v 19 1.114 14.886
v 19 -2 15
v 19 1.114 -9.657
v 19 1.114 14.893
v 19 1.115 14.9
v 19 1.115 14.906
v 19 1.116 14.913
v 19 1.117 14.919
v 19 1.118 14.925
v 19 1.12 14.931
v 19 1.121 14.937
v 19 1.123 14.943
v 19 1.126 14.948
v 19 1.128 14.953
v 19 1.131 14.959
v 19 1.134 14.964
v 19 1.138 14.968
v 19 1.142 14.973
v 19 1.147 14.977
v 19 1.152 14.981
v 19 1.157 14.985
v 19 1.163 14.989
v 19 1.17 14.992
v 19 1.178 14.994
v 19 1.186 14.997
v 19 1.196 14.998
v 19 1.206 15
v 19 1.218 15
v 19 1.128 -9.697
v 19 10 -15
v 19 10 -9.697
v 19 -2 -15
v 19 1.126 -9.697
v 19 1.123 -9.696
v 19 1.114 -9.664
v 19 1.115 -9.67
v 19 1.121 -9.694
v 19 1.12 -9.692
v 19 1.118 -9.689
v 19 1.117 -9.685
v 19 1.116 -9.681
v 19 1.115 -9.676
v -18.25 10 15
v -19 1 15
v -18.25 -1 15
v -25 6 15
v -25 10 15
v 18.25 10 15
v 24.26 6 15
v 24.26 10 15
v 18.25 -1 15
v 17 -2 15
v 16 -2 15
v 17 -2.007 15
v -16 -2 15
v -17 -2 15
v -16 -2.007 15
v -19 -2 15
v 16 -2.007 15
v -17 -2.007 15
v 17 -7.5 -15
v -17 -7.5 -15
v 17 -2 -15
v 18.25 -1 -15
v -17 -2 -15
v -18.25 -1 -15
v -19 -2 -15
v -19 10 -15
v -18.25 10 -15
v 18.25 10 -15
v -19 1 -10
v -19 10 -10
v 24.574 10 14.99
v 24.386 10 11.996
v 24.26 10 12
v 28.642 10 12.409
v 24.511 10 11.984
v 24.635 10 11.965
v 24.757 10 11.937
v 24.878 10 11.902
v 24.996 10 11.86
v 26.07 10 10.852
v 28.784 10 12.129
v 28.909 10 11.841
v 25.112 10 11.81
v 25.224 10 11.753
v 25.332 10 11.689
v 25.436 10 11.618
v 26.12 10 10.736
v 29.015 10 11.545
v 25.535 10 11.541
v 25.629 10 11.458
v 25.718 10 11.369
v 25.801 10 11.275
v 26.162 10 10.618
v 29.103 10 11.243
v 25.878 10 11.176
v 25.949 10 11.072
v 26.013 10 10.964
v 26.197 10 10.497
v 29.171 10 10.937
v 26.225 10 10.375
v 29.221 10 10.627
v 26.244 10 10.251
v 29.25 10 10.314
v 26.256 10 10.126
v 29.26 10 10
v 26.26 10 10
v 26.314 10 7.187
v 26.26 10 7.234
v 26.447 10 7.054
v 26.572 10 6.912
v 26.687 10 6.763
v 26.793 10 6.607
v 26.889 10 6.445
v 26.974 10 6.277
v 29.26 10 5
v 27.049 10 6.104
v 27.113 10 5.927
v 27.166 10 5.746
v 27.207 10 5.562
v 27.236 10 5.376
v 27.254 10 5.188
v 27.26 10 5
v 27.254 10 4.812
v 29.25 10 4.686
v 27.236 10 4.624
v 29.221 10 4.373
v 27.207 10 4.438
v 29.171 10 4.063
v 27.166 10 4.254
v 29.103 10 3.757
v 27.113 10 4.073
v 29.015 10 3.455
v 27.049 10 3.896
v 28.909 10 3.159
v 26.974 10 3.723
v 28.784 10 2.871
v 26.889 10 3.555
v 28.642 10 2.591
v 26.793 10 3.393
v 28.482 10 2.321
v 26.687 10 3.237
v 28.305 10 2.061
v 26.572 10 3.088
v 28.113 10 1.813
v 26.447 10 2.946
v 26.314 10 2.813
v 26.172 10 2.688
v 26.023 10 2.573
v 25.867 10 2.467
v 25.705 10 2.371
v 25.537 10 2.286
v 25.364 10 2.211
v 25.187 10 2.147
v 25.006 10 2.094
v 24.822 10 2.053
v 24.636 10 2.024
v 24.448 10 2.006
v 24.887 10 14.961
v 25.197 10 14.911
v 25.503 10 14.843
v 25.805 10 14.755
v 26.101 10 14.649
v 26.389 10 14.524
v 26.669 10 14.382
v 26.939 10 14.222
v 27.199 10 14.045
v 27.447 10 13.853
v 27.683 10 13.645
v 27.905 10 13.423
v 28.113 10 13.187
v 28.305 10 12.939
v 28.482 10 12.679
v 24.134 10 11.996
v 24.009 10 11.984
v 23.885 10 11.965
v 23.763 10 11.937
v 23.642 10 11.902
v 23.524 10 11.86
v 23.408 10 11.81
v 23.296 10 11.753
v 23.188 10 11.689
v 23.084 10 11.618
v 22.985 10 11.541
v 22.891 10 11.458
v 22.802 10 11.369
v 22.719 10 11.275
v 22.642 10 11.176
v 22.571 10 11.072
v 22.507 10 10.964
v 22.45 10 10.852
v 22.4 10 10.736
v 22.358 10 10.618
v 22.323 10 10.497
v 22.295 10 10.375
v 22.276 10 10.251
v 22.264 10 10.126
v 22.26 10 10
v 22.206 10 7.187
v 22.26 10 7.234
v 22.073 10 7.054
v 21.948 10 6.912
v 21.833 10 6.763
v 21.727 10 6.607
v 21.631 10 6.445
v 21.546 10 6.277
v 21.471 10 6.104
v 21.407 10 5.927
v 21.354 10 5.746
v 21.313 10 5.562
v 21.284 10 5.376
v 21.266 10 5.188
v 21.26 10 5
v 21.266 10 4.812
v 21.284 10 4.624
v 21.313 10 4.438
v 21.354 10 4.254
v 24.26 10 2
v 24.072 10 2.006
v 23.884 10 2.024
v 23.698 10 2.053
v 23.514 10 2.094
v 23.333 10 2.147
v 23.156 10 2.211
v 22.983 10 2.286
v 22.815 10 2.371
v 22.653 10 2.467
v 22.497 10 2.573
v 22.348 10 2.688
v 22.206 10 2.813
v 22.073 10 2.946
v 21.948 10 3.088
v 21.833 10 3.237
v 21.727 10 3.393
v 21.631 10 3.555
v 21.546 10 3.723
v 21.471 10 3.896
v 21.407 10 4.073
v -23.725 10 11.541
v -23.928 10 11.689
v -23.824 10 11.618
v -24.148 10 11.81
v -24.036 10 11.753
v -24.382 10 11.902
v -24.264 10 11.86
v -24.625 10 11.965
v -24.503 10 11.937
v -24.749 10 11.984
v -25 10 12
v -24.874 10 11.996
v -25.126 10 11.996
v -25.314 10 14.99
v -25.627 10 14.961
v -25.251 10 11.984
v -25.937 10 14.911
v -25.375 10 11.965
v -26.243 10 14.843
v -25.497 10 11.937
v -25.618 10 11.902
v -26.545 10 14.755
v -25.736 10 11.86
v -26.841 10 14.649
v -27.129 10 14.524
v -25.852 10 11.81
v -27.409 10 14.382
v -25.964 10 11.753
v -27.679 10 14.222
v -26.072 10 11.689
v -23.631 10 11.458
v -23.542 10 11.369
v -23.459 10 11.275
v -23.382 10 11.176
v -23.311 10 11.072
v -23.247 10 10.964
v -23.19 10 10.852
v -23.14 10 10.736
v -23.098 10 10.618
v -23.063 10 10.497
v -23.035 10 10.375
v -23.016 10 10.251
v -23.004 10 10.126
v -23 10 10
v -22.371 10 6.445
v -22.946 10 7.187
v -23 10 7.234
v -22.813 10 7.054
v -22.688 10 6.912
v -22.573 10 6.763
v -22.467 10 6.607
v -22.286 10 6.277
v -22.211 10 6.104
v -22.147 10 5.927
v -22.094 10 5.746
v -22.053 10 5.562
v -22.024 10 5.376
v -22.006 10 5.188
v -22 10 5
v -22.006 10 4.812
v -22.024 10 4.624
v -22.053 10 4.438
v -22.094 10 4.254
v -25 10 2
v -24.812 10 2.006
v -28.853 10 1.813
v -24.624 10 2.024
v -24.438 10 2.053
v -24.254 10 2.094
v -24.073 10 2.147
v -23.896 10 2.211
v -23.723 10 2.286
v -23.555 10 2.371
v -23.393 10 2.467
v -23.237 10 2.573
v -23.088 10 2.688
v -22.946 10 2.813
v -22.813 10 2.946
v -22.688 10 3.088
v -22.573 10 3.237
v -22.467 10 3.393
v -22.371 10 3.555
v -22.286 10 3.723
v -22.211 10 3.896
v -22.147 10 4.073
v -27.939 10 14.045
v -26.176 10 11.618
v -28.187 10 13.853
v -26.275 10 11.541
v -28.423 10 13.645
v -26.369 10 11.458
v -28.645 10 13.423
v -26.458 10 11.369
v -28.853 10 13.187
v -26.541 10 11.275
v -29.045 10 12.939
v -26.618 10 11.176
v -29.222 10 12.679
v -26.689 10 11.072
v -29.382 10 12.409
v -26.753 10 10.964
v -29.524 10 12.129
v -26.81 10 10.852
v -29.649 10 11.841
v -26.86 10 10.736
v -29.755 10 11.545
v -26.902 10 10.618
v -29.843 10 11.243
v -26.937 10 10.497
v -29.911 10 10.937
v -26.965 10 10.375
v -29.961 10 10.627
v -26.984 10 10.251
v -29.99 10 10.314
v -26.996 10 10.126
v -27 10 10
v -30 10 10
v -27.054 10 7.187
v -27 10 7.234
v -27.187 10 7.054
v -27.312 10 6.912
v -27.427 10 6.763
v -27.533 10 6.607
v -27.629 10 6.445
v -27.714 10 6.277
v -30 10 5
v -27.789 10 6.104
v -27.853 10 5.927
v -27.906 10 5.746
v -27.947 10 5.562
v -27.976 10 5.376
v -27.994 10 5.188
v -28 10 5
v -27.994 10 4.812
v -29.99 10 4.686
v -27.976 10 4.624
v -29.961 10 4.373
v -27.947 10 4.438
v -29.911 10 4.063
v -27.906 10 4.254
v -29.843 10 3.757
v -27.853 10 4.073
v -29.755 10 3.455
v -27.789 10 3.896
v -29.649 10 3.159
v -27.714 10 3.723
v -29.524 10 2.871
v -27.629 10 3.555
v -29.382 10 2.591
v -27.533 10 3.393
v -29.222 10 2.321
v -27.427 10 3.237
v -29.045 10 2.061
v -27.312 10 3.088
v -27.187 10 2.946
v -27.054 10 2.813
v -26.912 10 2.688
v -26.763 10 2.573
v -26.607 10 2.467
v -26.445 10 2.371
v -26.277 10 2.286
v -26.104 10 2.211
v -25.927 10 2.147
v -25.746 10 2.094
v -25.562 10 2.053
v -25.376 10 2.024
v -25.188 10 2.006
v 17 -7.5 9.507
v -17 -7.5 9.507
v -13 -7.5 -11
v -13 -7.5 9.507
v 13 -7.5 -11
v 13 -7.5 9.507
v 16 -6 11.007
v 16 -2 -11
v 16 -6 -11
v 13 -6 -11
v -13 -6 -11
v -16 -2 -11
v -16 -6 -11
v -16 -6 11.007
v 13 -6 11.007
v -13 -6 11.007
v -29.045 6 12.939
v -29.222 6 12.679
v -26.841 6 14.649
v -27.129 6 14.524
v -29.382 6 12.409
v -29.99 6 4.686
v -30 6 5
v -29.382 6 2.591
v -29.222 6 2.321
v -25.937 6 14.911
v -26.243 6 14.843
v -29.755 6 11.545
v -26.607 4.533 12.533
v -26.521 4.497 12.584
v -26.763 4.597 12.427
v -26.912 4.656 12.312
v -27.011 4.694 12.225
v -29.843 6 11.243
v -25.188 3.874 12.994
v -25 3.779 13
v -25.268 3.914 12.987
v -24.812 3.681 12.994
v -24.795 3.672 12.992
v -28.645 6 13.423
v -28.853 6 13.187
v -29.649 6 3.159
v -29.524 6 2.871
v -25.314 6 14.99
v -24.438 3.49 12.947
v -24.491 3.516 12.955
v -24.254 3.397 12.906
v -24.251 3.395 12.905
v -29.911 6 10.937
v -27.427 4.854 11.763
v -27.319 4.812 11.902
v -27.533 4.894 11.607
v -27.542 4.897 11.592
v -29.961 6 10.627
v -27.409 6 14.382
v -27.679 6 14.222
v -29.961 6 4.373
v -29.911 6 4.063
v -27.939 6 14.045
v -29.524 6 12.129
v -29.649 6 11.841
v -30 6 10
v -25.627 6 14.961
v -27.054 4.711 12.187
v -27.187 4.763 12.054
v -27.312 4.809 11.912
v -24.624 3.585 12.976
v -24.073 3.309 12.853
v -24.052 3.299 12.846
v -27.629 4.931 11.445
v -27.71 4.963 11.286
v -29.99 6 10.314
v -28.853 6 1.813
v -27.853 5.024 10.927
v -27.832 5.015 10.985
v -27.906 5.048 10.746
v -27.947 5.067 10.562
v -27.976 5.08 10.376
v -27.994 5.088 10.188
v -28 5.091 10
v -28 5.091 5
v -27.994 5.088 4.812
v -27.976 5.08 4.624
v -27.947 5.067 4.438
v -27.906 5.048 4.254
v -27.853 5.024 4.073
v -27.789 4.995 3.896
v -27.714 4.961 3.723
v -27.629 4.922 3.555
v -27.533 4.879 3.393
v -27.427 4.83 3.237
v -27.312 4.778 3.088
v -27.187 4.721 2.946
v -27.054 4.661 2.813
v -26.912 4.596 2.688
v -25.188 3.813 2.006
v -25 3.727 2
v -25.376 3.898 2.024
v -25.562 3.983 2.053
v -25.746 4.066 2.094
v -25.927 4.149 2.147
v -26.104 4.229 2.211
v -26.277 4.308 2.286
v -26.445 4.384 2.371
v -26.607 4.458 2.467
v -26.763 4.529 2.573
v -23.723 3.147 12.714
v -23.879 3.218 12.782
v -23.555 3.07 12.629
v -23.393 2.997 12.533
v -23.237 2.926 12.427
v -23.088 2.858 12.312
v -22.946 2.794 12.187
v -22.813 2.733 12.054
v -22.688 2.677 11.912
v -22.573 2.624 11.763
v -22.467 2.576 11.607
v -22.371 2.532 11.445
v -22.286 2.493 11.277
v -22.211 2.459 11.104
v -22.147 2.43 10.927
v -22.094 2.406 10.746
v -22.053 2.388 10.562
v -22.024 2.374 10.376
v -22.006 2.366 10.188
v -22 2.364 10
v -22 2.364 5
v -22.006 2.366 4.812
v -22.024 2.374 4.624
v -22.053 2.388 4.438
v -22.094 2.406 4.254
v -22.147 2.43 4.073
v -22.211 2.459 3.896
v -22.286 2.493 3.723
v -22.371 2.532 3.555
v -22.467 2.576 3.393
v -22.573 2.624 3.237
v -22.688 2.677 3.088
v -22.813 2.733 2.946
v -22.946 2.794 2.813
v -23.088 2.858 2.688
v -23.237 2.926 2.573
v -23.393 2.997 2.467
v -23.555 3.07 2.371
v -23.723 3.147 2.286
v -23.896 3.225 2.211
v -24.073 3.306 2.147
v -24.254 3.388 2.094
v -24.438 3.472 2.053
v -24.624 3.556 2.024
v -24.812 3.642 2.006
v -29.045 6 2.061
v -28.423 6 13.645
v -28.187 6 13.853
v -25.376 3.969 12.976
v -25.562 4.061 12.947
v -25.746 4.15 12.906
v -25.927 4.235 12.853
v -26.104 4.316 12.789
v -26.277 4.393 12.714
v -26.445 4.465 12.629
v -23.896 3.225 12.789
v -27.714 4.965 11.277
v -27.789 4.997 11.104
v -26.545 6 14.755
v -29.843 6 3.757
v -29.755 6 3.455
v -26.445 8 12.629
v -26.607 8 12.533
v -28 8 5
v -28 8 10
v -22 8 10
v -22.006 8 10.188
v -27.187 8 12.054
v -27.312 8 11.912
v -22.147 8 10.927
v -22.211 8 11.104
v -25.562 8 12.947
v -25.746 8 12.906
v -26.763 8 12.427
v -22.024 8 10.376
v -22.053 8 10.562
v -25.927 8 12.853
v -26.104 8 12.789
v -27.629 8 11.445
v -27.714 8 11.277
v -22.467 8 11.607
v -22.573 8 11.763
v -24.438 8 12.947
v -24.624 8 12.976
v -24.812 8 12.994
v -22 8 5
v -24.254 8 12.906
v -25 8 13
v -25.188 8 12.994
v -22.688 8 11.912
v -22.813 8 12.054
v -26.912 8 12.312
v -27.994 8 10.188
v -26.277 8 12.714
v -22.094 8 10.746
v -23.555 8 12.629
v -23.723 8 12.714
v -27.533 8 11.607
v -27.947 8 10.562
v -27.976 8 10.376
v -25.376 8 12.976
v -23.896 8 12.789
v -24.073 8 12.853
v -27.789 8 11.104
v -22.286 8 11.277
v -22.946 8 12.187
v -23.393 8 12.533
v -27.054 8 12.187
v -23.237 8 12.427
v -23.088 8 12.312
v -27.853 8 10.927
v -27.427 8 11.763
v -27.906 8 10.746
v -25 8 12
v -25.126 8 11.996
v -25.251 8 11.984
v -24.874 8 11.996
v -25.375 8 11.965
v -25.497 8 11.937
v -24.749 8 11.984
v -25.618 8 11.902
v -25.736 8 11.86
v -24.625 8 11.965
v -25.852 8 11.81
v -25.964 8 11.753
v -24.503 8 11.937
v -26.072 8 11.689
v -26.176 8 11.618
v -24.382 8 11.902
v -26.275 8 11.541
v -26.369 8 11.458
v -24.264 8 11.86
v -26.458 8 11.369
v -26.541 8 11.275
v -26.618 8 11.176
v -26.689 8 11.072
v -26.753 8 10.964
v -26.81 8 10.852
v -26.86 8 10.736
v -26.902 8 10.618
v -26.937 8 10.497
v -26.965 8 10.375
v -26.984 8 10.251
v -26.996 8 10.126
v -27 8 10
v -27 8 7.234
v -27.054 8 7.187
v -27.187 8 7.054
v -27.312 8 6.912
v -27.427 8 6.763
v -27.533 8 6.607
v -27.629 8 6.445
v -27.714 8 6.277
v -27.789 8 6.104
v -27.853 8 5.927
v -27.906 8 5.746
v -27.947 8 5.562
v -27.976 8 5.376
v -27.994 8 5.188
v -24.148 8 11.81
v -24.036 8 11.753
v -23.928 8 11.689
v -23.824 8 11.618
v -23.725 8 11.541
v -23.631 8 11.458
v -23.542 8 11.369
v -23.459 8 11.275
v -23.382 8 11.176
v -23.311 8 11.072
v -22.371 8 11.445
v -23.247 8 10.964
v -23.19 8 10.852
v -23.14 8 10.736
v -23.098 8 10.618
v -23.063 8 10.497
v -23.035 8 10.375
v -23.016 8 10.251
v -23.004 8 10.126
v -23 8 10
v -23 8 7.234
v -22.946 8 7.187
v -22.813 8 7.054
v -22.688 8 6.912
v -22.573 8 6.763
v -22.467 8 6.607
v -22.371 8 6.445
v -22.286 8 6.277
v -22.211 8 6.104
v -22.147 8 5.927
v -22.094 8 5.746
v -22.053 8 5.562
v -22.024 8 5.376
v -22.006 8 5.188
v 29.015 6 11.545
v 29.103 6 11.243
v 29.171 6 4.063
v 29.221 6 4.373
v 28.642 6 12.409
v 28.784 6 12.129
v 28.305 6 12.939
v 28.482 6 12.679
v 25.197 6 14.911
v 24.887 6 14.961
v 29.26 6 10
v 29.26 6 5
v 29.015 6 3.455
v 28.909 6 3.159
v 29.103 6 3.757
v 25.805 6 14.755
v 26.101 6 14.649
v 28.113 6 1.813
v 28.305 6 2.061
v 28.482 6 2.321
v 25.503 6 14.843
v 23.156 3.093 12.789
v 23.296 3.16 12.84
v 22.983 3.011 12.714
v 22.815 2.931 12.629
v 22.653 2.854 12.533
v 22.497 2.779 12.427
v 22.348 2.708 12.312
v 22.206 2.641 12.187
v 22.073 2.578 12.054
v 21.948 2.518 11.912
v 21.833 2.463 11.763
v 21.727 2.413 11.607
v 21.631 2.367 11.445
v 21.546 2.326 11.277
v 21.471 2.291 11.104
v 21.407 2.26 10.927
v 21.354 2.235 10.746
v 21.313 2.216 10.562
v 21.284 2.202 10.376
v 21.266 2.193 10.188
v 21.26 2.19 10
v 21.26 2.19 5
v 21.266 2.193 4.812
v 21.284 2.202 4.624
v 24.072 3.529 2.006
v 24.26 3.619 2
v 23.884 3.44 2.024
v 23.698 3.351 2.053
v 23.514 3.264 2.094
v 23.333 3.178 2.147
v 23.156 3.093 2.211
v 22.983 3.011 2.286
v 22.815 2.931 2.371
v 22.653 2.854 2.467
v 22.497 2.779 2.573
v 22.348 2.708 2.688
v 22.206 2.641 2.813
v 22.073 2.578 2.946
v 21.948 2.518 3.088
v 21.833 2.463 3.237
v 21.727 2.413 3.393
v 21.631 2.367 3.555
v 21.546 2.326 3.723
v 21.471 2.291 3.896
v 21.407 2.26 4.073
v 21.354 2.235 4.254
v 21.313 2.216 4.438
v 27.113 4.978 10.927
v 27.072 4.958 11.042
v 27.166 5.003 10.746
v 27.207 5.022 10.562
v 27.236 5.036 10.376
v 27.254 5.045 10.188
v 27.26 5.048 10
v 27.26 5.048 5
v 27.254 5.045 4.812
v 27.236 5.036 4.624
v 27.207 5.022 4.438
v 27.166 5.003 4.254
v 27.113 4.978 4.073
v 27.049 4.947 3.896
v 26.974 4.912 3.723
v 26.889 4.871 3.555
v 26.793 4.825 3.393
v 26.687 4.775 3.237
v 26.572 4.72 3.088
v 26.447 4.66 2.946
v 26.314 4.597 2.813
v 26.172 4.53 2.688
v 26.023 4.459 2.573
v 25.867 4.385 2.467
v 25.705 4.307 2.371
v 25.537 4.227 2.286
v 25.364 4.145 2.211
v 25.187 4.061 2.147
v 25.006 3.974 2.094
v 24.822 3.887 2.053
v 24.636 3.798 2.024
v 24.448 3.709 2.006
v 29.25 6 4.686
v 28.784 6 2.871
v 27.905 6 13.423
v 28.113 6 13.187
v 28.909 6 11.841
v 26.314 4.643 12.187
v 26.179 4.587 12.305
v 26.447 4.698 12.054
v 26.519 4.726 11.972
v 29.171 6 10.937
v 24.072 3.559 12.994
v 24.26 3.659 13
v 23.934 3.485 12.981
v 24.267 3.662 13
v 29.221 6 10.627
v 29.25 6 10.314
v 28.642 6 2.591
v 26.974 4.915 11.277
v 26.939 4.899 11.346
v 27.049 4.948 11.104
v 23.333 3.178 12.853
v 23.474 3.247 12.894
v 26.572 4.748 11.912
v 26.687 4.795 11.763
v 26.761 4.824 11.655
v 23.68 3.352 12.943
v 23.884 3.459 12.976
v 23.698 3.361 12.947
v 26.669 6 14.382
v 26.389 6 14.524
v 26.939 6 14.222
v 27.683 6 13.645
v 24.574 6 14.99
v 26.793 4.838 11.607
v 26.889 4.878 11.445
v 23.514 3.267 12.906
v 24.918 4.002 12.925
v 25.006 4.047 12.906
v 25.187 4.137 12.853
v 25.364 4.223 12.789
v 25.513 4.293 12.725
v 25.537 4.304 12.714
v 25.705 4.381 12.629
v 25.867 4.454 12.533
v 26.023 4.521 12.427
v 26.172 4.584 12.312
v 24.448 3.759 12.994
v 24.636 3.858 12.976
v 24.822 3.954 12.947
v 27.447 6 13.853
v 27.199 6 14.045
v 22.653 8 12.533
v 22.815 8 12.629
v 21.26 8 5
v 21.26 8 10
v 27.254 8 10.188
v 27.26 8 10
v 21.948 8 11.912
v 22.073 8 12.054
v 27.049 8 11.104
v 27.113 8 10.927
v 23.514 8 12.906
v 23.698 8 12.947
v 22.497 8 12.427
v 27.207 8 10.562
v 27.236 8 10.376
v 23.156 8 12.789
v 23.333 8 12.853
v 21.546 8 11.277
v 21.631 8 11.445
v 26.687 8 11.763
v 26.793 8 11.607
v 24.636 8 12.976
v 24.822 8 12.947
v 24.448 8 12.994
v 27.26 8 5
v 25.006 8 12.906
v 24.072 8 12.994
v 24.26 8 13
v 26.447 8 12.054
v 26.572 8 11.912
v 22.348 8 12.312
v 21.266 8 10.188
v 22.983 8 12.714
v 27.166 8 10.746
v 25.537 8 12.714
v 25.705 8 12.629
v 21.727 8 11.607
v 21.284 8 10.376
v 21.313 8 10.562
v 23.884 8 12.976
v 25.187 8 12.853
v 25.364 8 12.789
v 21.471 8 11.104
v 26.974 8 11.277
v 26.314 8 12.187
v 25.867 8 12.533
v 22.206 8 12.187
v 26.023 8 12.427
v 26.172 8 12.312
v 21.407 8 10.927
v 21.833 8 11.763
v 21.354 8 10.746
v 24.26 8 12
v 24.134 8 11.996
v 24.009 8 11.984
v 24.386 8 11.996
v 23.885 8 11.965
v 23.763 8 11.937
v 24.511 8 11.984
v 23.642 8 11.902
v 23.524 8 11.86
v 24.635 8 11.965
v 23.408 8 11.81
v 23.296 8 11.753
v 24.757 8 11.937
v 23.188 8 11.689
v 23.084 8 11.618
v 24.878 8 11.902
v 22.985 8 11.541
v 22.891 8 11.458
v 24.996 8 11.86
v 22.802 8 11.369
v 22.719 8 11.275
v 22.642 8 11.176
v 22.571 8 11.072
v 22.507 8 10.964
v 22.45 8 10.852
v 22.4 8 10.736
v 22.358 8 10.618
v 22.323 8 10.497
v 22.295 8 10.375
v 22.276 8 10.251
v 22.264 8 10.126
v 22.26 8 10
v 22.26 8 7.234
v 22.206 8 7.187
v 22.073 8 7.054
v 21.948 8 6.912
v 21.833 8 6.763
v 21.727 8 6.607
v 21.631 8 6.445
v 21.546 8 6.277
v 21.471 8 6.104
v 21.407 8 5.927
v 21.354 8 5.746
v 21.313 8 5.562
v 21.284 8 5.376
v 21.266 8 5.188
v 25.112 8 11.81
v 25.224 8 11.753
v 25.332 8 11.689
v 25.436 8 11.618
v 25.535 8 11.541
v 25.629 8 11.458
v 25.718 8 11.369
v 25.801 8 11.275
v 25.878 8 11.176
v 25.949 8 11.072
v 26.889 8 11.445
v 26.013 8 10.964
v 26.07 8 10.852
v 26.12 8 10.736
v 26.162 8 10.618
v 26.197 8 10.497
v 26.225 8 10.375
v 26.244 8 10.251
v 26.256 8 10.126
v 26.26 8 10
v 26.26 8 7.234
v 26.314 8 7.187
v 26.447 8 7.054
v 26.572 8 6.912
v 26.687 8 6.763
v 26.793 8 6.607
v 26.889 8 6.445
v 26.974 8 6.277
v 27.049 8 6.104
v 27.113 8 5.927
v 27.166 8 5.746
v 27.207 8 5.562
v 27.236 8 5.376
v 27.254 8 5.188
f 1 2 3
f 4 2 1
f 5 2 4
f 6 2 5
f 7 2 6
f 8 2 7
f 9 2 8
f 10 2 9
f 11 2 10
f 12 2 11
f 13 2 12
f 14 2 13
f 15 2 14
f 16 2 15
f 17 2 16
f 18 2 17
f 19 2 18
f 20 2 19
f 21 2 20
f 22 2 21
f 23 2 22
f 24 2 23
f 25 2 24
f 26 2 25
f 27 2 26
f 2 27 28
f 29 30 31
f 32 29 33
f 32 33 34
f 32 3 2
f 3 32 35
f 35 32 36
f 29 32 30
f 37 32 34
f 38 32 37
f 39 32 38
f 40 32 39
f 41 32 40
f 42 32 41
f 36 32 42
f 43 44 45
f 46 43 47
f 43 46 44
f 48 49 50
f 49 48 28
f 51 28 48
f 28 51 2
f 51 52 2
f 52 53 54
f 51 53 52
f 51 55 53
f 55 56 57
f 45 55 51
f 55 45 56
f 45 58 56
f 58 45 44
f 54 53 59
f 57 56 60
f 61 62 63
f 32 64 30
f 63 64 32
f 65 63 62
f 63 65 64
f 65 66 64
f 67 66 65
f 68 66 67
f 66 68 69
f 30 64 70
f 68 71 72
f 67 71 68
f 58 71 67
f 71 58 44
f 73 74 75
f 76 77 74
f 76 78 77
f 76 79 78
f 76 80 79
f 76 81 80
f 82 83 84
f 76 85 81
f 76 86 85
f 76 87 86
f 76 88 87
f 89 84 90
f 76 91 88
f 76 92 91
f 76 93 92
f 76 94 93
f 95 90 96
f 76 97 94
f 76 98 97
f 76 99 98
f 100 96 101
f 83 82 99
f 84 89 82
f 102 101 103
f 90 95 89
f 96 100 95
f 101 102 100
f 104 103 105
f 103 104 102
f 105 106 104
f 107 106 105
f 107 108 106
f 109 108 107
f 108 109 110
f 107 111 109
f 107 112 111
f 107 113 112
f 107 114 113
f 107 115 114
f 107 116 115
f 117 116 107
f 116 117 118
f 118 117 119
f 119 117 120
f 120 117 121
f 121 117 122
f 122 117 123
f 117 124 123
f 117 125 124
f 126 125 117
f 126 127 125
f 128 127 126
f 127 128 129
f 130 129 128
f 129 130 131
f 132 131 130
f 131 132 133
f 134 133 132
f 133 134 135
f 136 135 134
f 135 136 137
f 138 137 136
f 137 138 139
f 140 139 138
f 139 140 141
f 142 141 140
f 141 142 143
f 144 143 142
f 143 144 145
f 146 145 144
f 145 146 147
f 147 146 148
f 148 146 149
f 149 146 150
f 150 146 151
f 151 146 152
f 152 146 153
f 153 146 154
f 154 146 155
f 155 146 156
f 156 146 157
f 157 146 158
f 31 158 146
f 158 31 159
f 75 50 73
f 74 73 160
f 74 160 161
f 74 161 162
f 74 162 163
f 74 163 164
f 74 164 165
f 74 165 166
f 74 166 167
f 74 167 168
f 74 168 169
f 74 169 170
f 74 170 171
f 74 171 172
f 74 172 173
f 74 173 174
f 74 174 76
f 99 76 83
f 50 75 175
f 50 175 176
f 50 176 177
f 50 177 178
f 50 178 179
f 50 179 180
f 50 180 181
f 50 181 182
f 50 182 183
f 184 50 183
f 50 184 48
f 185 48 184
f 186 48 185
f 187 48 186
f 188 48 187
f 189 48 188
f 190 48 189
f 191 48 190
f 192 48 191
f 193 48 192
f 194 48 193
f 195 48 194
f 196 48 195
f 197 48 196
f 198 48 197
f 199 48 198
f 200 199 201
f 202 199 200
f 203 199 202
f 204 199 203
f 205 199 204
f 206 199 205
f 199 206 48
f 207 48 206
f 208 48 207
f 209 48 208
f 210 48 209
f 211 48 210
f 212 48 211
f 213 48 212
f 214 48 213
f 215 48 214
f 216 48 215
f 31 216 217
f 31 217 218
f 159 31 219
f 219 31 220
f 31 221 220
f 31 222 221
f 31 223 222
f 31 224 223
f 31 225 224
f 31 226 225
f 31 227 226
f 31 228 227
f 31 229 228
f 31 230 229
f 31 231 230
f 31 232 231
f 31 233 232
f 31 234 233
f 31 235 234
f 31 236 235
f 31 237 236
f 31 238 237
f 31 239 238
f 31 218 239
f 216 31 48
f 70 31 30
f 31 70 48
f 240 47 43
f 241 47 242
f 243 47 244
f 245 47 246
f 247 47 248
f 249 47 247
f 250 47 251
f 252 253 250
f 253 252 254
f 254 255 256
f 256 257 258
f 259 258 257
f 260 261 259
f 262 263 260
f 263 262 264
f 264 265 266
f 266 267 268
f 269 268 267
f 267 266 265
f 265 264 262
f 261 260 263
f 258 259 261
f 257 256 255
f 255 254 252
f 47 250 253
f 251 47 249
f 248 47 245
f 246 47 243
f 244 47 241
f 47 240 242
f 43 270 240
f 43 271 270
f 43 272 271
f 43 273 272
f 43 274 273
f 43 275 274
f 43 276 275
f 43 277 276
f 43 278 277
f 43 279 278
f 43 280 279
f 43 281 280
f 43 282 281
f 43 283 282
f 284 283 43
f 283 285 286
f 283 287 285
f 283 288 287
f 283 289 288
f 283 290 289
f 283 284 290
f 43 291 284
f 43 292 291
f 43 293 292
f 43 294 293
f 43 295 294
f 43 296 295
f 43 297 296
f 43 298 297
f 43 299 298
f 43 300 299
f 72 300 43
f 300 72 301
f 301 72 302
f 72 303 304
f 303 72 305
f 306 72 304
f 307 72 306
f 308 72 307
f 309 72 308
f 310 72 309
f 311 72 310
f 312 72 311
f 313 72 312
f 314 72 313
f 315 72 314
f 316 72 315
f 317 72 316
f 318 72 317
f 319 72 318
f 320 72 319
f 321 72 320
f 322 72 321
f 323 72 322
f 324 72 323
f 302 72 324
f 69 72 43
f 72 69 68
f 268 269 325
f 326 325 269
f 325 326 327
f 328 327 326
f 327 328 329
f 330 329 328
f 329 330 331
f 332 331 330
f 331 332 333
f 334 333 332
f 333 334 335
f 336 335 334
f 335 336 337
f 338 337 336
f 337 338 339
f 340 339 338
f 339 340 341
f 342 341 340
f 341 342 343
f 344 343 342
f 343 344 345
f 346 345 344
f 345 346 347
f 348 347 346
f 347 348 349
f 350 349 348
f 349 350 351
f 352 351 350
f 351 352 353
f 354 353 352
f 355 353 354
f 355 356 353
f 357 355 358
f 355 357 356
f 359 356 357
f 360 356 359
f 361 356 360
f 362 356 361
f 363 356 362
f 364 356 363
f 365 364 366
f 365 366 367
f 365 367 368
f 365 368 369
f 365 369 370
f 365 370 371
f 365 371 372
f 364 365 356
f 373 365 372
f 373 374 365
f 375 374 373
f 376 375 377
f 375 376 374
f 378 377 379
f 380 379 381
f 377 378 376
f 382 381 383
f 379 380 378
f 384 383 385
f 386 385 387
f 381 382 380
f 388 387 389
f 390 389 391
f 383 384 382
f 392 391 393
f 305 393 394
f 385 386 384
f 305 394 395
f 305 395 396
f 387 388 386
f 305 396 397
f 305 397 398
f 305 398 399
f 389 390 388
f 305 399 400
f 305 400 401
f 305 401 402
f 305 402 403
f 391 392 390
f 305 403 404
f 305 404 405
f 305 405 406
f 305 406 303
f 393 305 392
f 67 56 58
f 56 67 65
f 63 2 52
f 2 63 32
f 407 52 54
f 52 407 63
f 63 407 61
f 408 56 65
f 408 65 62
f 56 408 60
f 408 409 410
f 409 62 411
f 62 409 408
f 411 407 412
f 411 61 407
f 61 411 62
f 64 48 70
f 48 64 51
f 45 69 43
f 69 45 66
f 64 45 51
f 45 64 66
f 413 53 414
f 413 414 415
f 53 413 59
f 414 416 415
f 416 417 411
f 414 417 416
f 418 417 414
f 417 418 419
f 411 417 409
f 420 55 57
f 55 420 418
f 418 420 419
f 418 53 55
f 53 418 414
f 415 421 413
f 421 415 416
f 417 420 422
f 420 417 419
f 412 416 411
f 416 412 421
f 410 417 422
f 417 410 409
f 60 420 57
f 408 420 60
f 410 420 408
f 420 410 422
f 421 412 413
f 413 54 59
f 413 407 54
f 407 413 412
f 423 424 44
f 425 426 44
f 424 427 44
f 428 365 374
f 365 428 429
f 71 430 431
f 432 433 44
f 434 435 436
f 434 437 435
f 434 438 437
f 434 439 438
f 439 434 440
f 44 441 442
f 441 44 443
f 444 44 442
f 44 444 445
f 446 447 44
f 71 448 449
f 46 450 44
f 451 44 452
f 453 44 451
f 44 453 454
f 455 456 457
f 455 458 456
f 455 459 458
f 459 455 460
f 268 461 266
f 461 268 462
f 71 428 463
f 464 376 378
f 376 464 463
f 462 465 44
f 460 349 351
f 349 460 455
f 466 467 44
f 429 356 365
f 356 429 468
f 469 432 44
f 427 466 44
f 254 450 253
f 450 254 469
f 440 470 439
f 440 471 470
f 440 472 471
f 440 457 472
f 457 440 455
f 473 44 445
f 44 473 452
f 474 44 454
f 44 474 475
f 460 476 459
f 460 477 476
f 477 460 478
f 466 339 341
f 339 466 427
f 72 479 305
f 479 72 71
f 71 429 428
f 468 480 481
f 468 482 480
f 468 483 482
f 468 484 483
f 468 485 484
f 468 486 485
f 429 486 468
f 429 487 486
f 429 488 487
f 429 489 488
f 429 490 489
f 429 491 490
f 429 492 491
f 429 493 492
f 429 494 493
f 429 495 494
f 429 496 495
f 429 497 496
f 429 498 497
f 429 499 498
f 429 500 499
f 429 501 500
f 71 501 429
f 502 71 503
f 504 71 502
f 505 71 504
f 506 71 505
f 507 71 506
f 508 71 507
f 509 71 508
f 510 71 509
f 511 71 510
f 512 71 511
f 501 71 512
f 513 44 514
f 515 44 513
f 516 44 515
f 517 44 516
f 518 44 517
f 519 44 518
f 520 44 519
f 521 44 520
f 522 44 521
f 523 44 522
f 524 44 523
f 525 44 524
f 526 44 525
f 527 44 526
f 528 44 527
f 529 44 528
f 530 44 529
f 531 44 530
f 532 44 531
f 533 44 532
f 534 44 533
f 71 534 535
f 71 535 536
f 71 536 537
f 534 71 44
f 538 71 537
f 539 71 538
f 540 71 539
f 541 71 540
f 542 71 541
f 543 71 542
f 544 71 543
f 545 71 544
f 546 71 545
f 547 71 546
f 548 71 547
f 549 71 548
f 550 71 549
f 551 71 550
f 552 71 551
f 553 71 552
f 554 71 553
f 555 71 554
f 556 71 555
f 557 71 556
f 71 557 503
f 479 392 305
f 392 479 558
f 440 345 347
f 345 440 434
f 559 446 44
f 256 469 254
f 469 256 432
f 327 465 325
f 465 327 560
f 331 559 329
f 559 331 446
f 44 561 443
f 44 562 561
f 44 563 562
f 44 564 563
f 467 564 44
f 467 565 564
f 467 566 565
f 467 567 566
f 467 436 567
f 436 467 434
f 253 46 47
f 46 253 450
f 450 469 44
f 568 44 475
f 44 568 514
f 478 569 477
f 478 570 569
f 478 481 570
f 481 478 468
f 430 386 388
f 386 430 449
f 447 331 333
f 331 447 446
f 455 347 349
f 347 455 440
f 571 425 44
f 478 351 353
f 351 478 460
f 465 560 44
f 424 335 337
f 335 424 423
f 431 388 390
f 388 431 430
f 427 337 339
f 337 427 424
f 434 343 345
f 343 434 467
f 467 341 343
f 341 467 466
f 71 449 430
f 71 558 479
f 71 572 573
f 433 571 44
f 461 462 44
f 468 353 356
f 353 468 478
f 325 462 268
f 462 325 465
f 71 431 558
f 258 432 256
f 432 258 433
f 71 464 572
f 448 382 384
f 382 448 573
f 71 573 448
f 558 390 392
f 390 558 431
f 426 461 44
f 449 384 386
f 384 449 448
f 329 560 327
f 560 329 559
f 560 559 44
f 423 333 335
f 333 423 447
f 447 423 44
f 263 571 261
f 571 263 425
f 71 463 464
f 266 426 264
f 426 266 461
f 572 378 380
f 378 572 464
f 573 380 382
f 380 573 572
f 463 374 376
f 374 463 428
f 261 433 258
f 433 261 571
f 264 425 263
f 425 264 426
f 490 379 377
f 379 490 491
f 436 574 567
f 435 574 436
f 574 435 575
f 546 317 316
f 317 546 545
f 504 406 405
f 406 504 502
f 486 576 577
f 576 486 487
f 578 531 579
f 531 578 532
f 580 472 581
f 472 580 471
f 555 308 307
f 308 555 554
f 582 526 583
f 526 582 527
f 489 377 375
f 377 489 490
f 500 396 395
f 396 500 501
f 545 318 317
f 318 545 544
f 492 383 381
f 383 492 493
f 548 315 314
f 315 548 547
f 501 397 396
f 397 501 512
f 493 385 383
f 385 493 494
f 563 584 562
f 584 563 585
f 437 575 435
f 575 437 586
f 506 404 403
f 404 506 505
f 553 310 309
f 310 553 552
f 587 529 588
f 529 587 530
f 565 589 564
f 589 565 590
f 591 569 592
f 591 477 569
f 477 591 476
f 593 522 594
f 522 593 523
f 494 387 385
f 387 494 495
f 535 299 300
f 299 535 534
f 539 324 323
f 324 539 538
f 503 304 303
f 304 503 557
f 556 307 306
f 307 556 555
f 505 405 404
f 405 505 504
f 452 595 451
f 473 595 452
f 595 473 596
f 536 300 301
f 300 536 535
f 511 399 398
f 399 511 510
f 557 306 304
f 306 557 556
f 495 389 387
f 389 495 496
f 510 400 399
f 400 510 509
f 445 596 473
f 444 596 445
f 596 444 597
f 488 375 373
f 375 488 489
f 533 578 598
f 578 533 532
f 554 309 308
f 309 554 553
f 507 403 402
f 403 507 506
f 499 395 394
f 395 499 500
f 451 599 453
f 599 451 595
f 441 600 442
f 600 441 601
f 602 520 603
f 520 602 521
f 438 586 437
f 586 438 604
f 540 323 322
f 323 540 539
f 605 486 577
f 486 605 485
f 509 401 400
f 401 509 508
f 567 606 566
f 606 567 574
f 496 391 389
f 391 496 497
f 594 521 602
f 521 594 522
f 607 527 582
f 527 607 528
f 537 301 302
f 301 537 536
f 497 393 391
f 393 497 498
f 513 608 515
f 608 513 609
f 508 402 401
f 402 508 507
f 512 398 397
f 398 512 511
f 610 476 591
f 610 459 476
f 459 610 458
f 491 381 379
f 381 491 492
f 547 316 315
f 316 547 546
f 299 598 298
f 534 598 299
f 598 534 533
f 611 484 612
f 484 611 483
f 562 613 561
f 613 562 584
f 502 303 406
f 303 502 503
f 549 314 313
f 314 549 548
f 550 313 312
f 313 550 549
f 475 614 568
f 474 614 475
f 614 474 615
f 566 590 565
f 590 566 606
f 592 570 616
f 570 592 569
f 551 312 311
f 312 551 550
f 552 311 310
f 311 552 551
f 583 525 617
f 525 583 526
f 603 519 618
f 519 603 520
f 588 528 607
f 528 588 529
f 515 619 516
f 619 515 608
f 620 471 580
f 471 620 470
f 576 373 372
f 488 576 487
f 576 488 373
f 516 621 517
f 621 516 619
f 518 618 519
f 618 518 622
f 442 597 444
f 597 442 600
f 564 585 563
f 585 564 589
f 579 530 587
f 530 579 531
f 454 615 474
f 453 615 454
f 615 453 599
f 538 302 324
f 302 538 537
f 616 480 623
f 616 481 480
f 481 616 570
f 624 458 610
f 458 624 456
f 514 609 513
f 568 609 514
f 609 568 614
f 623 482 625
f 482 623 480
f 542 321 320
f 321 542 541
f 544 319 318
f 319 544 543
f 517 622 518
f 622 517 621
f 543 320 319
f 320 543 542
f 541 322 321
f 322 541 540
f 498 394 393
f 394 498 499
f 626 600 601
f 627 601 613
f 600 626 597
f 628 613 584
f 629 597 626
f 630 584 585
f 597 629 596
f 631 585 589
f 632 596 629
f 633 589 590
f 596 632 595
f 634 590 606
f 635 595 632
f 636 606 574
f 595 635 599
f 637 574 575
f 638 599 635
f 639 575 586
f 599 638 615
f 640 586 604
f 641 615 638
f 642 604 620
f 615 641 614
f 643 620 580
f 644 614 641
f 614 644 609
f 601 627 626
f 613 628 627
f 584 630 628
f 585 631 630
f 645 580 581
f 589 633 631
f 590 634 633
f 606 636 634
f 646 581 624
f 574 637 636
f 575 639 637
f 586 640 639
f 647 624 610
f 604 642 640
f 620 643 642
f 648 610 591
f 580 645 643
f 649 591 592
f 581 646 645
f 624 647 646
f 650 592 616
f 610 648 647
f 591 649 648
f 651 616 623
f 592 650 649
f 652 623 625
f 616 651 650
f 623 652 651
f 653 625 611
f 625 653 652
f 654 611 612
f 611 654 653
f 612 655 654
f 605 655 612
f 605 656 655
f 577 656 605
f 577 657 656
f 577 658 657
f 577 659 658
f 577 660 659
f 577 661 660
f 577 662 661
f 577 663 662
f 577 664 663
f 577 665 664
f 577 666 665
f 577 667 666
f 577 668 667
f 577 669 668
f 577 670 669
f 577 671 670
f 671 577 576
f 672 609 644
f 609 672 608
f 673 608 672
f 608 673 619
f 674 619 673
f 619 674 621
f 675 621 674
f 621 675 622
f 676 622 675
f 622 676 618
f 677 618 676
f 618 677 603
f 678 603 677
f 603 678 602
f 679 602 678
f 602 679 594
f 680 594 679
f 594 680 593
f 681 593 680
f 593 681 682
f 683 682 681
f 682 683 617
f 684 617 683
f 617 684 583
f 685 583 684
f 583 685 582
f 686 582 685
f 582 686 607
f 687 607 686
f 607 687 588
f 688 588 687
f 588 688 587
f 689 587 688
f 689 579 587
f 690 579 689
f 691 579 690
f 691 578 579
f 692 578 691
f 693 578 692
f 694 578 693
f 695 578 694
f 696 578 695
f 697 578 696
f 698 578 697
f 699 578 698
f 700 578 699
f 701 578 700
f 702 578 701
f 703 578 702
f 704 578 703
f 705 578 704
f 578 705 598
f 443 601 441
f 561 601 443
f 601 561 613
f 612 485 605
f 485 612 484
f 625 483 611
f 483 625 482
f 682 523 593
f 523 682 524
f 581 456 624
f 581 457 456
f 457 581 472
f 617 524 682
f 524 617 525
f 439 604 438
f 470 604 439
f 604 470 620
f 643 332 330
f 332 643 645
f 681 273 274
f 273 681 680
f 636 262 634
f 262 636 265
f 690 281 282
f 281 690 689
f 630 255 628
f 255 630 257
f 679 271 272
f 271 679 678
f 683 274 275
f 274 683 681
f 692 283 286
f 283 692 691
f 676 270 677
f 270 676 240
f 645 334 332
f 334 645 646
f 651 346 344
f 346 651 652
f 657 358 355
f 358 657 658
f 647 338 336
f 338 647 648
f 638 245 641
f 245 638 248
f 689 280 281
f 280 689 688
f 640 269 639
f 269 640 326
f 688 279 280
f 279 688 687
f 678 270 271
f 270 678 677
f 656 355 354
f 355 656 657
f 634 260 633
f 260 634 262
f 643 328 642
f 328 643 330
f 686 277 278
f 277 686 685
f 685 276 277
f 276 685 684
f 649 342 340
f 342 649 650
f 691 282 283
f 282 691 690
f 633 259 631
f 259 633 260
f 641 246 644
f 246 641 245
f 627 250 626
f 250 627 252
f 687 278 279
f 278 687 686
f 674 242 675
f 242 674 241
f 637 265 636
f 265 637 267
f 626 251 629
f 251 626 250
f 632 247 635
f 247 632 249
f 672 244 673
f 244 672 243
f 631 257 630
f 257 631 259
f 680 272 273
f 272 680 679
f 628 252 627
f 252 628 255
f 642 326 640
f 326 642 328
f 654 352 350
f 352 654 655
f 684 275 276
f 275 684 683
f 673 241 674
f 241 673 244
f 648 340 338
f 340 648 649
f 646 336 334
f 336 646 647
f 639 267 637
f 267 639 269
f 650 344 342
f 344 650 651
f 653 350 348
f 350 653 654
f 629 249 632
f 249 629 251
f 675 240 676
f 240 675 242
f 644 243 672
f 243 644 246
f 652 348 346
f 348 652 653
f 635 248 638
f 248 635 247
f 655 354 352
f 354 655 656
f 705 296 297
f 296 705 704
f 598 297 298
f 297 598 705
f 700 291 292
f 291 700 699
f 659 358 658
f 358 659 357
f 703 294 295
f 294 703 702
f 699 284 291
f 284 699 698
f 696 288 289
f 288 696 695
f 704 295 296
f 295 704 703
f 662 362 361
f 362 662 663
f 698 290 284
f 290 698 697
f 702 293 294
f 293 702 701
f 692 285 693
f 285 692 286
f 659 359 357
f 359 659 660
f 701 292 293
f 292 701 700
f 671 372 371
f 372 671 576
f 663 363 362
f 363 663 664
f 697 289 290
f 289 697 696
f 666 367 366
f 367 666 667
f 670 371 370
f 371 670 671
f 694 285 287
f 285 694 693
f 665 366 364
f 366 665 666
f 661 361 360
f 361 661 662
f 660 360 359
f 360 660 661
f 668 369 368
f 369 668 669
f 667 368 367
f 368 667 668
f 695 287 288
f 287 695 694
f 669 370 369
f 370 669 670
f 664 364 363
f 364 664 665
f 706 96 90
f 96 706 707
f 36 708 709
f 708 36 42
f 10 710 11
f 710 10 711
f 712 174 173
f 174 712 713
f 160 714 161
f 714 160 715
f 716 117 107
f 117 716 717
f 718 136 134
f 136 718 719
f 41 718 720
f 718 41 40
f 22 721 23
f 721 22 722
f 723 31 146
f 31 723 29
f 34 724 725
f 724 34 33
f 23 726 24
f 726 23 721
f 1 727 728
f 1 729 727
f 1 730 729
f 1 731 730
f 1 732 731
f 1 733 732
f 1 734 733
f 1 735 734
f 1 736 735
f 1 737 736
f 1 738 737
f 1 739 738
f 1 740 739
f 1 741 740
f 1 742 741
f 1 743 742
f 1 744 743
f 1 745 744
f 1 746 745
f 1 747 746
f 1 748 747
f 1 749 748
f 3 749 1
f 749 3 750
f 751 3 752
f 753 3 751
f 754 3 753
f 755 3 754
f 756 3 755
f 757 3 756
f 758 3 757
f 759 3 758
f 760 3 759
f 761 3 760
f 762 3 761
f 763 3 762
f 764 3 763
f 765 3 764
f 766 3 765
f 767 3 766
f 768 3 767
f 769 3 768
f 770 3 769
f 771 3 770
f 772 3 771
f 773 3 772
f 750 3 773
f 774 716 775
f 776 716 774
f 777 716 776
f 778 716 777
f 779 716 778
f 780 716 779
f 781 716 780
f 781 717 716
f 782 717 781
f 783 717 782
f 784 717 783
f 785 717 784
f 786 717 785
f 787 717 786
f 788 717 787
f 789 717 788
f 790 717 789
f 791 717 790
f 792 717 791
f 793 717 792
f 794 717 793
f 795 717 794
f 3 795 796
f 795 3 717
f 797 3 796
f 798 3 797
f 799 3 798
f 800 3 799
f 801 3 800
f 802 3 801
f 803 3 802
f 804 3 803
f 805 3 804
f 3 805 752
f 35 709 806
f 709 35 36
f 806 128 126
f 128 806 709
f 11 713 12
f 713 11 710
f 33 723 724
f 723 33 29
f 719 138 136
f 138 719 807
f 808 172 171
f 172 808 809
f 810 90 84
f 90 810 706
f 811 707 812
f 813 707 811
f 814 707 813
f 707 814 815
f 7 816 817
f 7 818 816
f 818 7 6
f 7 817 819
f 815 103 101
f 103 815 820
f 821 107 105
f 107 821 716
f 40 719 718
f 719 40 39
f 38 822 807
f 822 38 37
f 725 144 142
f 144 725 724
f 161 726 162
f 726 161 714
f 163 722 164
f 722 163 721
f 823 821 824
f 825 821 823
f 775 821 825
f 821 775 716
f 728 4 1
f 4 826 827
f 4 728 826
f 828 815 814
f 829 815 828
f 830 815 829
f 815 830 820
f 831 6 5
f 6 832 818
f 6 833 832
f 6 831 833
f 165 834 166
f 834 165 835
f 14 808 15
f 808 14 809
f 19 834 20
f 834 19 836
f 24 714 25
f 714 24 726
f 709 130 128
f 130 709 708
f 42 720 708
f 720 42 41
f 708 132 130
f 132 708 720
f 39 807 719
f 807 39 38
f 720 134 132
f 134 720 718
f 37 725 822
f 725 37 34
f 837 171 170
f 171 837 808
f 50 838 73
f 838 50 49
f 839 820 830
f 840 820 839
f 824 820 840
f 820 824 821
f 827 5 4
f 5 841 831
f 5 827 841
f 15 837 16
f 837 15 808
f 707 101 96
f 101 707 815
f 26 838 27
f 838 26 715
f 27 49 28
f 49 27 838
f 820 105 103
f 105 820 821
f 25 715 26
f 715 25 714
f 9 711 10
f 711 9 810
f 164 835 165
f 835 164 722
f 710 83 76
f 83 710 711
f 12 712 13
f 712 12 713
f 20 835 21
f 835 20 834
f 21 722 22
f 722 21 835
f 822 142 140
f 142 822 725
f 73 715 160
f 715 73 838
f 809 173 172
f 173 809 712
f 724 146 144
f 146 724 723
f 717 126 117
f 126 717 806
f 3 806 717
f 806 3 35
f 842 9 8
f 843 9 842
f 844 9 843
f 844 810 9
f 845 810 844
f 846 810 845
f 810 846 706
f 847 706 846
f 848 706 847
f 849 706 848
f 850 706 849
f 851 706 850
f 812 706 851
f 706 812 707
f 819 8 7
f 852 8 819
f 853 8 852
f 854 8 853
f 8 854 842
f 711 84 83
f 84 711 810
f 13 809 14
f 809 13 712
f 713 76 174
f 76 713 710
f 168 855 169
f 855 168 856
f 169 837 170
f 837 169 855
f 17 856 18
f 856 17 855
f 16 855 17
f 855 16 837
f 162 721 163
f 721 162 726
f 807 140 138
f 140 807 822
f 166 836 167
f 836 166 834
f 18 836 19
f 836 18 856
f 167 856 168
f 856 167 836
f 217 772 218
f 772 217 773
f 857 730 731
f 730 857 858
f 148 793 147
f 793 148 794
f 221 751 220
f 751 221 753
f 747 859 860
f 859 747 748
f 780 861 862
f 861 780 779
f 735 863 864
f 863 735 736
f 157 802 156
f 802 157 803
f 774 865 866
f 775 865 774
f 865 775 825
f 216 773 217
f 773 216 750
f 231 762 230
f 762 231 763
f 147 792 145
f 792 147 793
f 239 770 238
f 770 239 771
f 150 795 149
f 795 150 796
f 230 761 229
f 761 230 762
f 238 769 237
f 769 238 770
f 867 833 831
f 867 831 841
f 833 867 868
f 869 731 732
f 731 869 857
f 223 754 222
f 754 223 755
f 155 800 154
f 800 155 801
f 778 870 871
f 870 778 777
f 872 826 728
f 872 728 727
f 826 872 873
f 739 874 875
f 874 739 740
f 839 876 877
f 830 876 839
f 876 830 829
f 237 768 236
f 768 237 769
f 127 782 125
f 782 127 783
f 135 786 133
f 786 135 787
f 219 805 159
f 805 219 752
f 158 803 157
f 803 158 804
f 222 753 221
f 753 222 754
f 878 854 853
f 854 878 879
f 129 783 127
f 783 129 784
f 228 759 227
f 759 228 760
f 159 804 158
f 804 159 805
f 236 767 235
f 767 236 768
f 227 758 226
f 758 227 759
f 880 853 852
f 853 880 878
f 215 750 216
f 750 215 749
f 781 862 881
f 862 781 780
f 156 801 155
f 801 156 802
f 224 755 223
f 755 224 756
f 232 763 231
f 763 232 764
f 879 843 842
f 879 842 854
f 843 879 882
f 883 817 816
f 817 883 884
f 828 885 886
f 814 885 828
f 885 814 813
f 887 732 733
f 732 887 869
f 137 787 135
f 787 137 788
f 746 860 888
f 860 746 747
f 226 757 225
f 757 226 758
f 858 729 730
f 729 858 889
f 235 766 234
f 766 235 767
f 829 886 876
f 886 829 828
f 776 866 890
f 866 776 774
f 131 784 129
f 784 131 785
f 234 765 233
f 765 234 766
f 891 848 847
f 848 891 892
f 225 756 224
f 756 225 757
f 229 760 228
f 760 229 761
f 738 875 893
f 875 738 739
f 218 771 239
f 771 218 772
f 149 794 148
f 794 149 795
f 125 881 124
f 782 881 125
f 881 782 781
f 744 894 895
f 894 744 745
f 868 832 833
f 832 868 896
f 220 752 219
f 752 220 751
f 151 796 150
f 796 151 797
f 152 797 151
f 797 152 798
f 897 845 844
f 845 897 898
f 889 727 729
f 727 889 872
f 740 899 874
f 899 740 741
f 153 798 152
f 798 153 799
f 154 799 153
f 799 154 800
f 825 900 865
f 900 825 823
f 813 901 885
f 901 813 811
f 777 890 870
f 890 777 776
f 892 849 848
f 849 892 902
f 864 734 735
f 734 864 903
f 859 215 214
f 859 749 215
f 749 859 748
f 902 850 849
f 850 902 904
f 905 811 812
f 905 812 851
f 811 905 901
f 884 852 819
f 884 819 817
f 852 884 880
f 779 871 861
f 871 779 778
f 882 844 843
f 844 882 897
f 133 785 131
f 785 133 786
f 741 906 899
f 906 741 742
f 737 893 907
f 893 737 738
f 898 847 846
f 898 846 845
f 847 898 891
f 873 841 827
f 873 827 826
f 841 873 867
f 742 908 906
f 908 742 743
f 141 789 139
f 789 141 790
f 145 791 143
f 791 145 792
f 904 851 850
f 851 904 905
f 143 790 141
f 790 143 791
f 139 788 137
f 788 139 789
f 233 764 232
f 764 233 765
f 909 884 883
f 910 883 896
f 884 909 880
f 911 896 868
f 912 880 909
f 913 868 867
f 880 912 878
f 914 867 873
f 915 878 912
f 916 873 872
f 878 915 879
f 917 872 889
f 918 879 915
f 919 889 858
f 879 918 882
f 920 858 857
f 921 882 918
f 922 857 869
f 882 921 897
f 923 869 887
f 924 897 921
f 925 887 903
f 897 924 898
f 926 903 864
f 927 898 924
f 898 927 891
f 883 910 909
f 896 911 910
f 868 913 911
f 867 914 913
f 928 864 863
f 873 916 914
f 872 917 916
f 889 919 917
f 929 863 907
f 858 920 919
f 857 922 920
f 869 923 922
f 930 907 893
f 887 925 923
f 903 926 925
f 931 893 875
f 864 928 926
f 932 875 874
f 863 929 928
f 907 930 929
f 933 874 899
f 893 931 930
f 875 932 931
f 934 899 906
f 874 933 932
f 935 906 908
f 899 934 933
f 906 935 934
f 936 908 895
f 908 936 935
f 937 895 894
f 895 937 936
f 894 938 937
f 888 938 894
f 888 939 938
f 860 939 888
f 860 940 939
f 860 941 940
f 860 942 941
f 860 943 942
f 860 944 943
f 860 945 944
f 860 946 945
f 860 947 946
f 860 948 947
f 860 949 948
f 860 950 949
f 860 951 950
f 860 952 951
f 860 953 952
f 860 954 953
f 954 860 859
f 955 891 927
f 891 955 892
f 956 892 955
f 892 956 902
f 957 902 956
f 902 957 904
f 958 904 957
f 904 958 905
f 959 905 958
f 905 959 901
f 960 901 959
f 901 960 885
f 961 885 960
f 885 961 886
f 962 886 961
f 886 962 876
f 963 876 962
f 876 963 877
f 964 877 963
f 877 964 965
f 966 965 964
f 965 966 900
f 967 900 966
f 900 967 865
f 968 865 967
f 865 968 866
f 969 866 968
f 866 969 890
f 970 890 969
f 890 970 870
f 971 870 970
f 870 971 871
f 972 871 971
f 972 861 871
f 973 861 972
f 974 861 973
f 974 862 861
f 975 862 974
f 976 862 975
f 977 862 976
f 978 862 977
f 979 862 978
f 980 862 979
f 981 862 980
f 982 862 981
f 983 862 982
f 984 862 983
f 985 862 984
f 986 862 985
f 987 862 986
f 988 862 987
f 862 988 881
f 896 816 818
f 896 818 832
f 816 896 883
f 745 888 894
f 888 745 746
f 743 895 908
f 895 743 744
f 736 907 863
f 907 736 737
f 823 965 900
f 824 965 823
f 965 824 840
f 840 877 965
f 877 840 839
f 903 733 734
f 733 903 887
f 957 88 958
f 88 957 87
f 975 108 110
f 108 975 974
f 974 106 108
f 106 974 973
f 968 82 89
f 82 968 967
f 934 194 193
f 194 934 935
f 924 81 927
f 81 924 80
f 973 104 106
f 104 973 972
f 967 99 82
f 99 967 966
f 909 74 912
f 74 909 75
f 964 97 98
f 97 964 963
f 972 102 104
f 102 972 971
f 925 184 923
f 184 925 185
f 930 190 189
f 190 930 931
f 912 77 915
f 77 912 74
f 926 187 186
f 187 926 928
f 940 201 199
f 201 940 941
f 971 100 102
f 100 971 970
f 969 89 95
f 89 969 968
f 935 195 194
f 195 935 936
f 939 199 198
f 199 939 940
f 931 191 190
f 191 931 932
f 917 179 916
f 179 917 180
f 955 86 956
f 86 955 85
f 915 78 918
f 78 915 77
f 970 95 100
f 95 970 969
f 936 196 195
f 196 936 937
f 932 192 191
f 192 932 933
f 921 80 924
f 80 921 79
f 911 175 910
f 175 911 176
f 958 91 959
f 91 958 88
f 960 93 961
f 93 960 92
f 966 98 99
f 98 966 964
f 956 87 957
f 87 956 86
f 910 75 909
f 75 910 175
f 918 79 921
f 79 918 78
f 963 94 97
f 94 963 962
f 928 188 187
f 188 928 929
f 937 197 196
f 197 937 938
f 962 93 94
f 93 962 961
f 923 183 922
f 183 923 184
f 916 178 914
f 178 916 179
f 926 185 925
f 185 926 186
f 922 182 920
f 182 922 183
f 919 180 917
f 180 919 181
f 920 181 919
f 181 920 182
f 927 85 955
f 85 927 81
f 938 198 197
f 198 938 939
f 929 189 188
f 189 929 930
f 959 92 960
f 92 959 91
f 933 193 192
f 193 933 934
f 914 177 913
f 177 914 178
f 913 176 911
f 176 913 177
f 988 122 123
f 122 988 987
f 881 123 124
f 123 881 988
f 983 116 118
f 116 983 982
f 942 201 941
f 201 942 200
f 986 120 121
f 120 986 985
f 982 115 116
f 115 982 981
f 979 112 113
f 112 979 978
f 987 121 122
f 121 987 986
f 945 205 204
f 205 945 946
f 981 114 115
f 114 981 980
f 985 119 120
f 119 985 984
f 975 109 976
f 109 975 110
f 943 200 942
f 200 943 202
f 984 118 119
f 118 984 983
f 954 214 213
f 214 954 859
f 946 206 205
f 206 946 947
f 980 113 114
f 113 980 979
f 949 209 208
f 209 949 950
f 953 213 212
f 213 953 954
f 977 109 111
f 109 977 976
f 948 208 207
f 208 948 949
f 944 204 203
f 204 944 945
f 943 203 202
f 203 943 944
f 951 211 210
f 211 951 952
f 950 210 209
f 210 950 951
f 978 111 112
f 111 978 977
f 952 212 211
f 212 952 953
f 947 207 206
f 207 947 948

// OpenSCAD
// file: batterycompartment.scad
//rotate([-90, 0, 0])
//container();




$fn=100;



//battery

cellX	= 34.1 +0.5;
cellY	= 05.8;
cellZ	= 53.1 +1;

recessX	= 30.1;
recessY	= 02.4;
recessZ	= 01.8;


module battery()
{
	difference()
	{
		hull()
		{
			cylinder(r=cellY/2, h=cellZ);
			
			translate([cellX-cellY, 0, 0])
			cylinder(r=cellY/2, h=cellZ);
			
			translate([-cellY/2, -cellY/2-20, 0])
			cube([cellX, cellY/2+20, cellZ]);
		}
		
		//corner pits
		translate([(cellX-cellY)/2, 0, 0])
		union()
		{
			translate([-recessX/2-cellY, cellY/2-recessY, -cellY+recessZ])
			cube([cellY, cellY, cellY]);
			
			translate([recessX/2, cellY/2-recessY, -cellY+recessZ])
			cube([cellY, cellY, cellY]);
		}
	}
}





//connector

connX	= 9.3;
connY	= 6.9;
connZ	= 4.9;
connPos	= 1.5;

module connector()
{
//	translate([0, -connPos, -connZ])
	translate([0, connPos-connY, -connZ])
	cube([connX, connY, connZ+0.01]);
}





//container

wall	= 1;

module container()
{
	difference()
	{
		union()
		{
			difference()
			{
				translate([-cellY/2-wall, -connY+connPos+0.01, -connZ-wall])
				cube([cellX+2*wall, connY+connPos+wall-0.01, connZ+cellZ+2*wall]);
				
				union()
				{
					battery();
					connector();
				}
			}
			
			translate([-cellY/2+cellX/2+4, -cellY/2, 0])
			rotate([0, 0, 180])
			rotate([-45, 0, 0])
			cube([8, recessZ, recessZ]);
			
			translate([-cellY/2+cellX+wall, -cellY/2, cellZ])
			rotate([0, 0, 180])
			rotate([-45, 0, 0])
			cube([cellX+2*wall, recessZ/2, recessZ/2]);
		}
		
		translate([-cellY/2+cellX/2, connPos-connY-1, cellZ+wall])
		rotate([-90, 0, 0])
		cylinder(r=10, h=connY-connPos+cellY/2+wall+2);
	}
}
// main file
// board size
// 32x50mm 

/*
 TODO:
	change mounting holes to be elongated - DONE
   Maybe slim up the PCB-compartment a bit.. and less material in the sides
	PCB needs to be redone due to new wiring of power from the battery
	total height ~20mm shorter
*/
include<batterycompartment.scad>

//translate([-14.5,23.2,20]) rotate([0,180,180]) container();

difference() {
//	translate([0,0.5,0])cube([38,19,50],center=true);
	union() {
		translate([0,0.5+7/2,0])cube([38,12,50-20],center=true);
		translate([0,1.5-11/2,0])cube([34,7,50-20],center=true);
	}
	translate([0,4.6,10.01])cube([36.5,11.2,55],center=true); // battery compartment
	translate([0,-4,4])cube([32,4,30],center=true); // PCB-compartment
	translate([0,-6.5,14])cube([26,8,50],center=true);

//	translate([0,-10.99,25.4+7])cube([39,6,50],center=true);
//	translate([0,-10.5,0.4+7]) rotate([45,0,0]) cube([39,2.15,2.15],center=true);

	translate([0,-6.25,15]) rotate([45,0,0]) cube([45,12,6],center=true);


}

// hangers
translate([-25,10,10]) {
	difference() {
		hull() {
	 		rotate([90,0,0]) cylinder(r=5,h=4,$fn=100);
	 		translate([0,0,-5]) rotate([90,0,0]) cylinder(r=5,h=4,$fn=100);
 			translate([6,-9,-20])cube([0.5,9,25]);
 		}
		hull() {
			translate([0,-2,0])rotate([90,0,0]) cylinder(r=3,h=20,$fn=100);	
			translate([0,-2,-5])rotate([90,0,0]) cylinder(r=3,h=20,$fn=100);
		}

		hull() {
			translate([0,2,0])rotate([90,0,0]) cylinder(r=2,h=20,$fn=100);
			translate([0,2,-5])rotate([90,0,0]) cylinder(r=2,h=20,$fn=100);
		}
		translate([0,2,-5])rotate([90,0,0]) cylinder(r=3,h=20,$fn=100);
	

	}
}
translate([24.26,10,10]) {
	difference() {
		hull() {
	 		rotate([90,0,0]) cylinder(r=5,h=4,$fn=100);
	 		translate([0,0,-5]) rotate([90,0,0]) cylinder(r=5,h=4,$fn=100);
 			translate([-6,-9,-20])cube([0.5,9,25]);
 		}

		hull() {
			translate([0,-2,0])rotate([90,0,0]) cylinder(r=3,h=20,$fn=100);	
			translate([0,-2,-5])rotate([90,0,0]) cylinder(r=3,h=20,$fn=100);
		}

		hull() {
			translate([0,2,0])rotate([90,0,0]) cylinder(r=2,h=20,$fn=100);
			translate([0,2,-5])rotate([90,0,0]) cylinder(r=2,h=20,$fn=100);
		}
		translate([0,2,-5])rotate([90,0,0]) cylinder(r=3,h=20,$fn=100);

	}
}
